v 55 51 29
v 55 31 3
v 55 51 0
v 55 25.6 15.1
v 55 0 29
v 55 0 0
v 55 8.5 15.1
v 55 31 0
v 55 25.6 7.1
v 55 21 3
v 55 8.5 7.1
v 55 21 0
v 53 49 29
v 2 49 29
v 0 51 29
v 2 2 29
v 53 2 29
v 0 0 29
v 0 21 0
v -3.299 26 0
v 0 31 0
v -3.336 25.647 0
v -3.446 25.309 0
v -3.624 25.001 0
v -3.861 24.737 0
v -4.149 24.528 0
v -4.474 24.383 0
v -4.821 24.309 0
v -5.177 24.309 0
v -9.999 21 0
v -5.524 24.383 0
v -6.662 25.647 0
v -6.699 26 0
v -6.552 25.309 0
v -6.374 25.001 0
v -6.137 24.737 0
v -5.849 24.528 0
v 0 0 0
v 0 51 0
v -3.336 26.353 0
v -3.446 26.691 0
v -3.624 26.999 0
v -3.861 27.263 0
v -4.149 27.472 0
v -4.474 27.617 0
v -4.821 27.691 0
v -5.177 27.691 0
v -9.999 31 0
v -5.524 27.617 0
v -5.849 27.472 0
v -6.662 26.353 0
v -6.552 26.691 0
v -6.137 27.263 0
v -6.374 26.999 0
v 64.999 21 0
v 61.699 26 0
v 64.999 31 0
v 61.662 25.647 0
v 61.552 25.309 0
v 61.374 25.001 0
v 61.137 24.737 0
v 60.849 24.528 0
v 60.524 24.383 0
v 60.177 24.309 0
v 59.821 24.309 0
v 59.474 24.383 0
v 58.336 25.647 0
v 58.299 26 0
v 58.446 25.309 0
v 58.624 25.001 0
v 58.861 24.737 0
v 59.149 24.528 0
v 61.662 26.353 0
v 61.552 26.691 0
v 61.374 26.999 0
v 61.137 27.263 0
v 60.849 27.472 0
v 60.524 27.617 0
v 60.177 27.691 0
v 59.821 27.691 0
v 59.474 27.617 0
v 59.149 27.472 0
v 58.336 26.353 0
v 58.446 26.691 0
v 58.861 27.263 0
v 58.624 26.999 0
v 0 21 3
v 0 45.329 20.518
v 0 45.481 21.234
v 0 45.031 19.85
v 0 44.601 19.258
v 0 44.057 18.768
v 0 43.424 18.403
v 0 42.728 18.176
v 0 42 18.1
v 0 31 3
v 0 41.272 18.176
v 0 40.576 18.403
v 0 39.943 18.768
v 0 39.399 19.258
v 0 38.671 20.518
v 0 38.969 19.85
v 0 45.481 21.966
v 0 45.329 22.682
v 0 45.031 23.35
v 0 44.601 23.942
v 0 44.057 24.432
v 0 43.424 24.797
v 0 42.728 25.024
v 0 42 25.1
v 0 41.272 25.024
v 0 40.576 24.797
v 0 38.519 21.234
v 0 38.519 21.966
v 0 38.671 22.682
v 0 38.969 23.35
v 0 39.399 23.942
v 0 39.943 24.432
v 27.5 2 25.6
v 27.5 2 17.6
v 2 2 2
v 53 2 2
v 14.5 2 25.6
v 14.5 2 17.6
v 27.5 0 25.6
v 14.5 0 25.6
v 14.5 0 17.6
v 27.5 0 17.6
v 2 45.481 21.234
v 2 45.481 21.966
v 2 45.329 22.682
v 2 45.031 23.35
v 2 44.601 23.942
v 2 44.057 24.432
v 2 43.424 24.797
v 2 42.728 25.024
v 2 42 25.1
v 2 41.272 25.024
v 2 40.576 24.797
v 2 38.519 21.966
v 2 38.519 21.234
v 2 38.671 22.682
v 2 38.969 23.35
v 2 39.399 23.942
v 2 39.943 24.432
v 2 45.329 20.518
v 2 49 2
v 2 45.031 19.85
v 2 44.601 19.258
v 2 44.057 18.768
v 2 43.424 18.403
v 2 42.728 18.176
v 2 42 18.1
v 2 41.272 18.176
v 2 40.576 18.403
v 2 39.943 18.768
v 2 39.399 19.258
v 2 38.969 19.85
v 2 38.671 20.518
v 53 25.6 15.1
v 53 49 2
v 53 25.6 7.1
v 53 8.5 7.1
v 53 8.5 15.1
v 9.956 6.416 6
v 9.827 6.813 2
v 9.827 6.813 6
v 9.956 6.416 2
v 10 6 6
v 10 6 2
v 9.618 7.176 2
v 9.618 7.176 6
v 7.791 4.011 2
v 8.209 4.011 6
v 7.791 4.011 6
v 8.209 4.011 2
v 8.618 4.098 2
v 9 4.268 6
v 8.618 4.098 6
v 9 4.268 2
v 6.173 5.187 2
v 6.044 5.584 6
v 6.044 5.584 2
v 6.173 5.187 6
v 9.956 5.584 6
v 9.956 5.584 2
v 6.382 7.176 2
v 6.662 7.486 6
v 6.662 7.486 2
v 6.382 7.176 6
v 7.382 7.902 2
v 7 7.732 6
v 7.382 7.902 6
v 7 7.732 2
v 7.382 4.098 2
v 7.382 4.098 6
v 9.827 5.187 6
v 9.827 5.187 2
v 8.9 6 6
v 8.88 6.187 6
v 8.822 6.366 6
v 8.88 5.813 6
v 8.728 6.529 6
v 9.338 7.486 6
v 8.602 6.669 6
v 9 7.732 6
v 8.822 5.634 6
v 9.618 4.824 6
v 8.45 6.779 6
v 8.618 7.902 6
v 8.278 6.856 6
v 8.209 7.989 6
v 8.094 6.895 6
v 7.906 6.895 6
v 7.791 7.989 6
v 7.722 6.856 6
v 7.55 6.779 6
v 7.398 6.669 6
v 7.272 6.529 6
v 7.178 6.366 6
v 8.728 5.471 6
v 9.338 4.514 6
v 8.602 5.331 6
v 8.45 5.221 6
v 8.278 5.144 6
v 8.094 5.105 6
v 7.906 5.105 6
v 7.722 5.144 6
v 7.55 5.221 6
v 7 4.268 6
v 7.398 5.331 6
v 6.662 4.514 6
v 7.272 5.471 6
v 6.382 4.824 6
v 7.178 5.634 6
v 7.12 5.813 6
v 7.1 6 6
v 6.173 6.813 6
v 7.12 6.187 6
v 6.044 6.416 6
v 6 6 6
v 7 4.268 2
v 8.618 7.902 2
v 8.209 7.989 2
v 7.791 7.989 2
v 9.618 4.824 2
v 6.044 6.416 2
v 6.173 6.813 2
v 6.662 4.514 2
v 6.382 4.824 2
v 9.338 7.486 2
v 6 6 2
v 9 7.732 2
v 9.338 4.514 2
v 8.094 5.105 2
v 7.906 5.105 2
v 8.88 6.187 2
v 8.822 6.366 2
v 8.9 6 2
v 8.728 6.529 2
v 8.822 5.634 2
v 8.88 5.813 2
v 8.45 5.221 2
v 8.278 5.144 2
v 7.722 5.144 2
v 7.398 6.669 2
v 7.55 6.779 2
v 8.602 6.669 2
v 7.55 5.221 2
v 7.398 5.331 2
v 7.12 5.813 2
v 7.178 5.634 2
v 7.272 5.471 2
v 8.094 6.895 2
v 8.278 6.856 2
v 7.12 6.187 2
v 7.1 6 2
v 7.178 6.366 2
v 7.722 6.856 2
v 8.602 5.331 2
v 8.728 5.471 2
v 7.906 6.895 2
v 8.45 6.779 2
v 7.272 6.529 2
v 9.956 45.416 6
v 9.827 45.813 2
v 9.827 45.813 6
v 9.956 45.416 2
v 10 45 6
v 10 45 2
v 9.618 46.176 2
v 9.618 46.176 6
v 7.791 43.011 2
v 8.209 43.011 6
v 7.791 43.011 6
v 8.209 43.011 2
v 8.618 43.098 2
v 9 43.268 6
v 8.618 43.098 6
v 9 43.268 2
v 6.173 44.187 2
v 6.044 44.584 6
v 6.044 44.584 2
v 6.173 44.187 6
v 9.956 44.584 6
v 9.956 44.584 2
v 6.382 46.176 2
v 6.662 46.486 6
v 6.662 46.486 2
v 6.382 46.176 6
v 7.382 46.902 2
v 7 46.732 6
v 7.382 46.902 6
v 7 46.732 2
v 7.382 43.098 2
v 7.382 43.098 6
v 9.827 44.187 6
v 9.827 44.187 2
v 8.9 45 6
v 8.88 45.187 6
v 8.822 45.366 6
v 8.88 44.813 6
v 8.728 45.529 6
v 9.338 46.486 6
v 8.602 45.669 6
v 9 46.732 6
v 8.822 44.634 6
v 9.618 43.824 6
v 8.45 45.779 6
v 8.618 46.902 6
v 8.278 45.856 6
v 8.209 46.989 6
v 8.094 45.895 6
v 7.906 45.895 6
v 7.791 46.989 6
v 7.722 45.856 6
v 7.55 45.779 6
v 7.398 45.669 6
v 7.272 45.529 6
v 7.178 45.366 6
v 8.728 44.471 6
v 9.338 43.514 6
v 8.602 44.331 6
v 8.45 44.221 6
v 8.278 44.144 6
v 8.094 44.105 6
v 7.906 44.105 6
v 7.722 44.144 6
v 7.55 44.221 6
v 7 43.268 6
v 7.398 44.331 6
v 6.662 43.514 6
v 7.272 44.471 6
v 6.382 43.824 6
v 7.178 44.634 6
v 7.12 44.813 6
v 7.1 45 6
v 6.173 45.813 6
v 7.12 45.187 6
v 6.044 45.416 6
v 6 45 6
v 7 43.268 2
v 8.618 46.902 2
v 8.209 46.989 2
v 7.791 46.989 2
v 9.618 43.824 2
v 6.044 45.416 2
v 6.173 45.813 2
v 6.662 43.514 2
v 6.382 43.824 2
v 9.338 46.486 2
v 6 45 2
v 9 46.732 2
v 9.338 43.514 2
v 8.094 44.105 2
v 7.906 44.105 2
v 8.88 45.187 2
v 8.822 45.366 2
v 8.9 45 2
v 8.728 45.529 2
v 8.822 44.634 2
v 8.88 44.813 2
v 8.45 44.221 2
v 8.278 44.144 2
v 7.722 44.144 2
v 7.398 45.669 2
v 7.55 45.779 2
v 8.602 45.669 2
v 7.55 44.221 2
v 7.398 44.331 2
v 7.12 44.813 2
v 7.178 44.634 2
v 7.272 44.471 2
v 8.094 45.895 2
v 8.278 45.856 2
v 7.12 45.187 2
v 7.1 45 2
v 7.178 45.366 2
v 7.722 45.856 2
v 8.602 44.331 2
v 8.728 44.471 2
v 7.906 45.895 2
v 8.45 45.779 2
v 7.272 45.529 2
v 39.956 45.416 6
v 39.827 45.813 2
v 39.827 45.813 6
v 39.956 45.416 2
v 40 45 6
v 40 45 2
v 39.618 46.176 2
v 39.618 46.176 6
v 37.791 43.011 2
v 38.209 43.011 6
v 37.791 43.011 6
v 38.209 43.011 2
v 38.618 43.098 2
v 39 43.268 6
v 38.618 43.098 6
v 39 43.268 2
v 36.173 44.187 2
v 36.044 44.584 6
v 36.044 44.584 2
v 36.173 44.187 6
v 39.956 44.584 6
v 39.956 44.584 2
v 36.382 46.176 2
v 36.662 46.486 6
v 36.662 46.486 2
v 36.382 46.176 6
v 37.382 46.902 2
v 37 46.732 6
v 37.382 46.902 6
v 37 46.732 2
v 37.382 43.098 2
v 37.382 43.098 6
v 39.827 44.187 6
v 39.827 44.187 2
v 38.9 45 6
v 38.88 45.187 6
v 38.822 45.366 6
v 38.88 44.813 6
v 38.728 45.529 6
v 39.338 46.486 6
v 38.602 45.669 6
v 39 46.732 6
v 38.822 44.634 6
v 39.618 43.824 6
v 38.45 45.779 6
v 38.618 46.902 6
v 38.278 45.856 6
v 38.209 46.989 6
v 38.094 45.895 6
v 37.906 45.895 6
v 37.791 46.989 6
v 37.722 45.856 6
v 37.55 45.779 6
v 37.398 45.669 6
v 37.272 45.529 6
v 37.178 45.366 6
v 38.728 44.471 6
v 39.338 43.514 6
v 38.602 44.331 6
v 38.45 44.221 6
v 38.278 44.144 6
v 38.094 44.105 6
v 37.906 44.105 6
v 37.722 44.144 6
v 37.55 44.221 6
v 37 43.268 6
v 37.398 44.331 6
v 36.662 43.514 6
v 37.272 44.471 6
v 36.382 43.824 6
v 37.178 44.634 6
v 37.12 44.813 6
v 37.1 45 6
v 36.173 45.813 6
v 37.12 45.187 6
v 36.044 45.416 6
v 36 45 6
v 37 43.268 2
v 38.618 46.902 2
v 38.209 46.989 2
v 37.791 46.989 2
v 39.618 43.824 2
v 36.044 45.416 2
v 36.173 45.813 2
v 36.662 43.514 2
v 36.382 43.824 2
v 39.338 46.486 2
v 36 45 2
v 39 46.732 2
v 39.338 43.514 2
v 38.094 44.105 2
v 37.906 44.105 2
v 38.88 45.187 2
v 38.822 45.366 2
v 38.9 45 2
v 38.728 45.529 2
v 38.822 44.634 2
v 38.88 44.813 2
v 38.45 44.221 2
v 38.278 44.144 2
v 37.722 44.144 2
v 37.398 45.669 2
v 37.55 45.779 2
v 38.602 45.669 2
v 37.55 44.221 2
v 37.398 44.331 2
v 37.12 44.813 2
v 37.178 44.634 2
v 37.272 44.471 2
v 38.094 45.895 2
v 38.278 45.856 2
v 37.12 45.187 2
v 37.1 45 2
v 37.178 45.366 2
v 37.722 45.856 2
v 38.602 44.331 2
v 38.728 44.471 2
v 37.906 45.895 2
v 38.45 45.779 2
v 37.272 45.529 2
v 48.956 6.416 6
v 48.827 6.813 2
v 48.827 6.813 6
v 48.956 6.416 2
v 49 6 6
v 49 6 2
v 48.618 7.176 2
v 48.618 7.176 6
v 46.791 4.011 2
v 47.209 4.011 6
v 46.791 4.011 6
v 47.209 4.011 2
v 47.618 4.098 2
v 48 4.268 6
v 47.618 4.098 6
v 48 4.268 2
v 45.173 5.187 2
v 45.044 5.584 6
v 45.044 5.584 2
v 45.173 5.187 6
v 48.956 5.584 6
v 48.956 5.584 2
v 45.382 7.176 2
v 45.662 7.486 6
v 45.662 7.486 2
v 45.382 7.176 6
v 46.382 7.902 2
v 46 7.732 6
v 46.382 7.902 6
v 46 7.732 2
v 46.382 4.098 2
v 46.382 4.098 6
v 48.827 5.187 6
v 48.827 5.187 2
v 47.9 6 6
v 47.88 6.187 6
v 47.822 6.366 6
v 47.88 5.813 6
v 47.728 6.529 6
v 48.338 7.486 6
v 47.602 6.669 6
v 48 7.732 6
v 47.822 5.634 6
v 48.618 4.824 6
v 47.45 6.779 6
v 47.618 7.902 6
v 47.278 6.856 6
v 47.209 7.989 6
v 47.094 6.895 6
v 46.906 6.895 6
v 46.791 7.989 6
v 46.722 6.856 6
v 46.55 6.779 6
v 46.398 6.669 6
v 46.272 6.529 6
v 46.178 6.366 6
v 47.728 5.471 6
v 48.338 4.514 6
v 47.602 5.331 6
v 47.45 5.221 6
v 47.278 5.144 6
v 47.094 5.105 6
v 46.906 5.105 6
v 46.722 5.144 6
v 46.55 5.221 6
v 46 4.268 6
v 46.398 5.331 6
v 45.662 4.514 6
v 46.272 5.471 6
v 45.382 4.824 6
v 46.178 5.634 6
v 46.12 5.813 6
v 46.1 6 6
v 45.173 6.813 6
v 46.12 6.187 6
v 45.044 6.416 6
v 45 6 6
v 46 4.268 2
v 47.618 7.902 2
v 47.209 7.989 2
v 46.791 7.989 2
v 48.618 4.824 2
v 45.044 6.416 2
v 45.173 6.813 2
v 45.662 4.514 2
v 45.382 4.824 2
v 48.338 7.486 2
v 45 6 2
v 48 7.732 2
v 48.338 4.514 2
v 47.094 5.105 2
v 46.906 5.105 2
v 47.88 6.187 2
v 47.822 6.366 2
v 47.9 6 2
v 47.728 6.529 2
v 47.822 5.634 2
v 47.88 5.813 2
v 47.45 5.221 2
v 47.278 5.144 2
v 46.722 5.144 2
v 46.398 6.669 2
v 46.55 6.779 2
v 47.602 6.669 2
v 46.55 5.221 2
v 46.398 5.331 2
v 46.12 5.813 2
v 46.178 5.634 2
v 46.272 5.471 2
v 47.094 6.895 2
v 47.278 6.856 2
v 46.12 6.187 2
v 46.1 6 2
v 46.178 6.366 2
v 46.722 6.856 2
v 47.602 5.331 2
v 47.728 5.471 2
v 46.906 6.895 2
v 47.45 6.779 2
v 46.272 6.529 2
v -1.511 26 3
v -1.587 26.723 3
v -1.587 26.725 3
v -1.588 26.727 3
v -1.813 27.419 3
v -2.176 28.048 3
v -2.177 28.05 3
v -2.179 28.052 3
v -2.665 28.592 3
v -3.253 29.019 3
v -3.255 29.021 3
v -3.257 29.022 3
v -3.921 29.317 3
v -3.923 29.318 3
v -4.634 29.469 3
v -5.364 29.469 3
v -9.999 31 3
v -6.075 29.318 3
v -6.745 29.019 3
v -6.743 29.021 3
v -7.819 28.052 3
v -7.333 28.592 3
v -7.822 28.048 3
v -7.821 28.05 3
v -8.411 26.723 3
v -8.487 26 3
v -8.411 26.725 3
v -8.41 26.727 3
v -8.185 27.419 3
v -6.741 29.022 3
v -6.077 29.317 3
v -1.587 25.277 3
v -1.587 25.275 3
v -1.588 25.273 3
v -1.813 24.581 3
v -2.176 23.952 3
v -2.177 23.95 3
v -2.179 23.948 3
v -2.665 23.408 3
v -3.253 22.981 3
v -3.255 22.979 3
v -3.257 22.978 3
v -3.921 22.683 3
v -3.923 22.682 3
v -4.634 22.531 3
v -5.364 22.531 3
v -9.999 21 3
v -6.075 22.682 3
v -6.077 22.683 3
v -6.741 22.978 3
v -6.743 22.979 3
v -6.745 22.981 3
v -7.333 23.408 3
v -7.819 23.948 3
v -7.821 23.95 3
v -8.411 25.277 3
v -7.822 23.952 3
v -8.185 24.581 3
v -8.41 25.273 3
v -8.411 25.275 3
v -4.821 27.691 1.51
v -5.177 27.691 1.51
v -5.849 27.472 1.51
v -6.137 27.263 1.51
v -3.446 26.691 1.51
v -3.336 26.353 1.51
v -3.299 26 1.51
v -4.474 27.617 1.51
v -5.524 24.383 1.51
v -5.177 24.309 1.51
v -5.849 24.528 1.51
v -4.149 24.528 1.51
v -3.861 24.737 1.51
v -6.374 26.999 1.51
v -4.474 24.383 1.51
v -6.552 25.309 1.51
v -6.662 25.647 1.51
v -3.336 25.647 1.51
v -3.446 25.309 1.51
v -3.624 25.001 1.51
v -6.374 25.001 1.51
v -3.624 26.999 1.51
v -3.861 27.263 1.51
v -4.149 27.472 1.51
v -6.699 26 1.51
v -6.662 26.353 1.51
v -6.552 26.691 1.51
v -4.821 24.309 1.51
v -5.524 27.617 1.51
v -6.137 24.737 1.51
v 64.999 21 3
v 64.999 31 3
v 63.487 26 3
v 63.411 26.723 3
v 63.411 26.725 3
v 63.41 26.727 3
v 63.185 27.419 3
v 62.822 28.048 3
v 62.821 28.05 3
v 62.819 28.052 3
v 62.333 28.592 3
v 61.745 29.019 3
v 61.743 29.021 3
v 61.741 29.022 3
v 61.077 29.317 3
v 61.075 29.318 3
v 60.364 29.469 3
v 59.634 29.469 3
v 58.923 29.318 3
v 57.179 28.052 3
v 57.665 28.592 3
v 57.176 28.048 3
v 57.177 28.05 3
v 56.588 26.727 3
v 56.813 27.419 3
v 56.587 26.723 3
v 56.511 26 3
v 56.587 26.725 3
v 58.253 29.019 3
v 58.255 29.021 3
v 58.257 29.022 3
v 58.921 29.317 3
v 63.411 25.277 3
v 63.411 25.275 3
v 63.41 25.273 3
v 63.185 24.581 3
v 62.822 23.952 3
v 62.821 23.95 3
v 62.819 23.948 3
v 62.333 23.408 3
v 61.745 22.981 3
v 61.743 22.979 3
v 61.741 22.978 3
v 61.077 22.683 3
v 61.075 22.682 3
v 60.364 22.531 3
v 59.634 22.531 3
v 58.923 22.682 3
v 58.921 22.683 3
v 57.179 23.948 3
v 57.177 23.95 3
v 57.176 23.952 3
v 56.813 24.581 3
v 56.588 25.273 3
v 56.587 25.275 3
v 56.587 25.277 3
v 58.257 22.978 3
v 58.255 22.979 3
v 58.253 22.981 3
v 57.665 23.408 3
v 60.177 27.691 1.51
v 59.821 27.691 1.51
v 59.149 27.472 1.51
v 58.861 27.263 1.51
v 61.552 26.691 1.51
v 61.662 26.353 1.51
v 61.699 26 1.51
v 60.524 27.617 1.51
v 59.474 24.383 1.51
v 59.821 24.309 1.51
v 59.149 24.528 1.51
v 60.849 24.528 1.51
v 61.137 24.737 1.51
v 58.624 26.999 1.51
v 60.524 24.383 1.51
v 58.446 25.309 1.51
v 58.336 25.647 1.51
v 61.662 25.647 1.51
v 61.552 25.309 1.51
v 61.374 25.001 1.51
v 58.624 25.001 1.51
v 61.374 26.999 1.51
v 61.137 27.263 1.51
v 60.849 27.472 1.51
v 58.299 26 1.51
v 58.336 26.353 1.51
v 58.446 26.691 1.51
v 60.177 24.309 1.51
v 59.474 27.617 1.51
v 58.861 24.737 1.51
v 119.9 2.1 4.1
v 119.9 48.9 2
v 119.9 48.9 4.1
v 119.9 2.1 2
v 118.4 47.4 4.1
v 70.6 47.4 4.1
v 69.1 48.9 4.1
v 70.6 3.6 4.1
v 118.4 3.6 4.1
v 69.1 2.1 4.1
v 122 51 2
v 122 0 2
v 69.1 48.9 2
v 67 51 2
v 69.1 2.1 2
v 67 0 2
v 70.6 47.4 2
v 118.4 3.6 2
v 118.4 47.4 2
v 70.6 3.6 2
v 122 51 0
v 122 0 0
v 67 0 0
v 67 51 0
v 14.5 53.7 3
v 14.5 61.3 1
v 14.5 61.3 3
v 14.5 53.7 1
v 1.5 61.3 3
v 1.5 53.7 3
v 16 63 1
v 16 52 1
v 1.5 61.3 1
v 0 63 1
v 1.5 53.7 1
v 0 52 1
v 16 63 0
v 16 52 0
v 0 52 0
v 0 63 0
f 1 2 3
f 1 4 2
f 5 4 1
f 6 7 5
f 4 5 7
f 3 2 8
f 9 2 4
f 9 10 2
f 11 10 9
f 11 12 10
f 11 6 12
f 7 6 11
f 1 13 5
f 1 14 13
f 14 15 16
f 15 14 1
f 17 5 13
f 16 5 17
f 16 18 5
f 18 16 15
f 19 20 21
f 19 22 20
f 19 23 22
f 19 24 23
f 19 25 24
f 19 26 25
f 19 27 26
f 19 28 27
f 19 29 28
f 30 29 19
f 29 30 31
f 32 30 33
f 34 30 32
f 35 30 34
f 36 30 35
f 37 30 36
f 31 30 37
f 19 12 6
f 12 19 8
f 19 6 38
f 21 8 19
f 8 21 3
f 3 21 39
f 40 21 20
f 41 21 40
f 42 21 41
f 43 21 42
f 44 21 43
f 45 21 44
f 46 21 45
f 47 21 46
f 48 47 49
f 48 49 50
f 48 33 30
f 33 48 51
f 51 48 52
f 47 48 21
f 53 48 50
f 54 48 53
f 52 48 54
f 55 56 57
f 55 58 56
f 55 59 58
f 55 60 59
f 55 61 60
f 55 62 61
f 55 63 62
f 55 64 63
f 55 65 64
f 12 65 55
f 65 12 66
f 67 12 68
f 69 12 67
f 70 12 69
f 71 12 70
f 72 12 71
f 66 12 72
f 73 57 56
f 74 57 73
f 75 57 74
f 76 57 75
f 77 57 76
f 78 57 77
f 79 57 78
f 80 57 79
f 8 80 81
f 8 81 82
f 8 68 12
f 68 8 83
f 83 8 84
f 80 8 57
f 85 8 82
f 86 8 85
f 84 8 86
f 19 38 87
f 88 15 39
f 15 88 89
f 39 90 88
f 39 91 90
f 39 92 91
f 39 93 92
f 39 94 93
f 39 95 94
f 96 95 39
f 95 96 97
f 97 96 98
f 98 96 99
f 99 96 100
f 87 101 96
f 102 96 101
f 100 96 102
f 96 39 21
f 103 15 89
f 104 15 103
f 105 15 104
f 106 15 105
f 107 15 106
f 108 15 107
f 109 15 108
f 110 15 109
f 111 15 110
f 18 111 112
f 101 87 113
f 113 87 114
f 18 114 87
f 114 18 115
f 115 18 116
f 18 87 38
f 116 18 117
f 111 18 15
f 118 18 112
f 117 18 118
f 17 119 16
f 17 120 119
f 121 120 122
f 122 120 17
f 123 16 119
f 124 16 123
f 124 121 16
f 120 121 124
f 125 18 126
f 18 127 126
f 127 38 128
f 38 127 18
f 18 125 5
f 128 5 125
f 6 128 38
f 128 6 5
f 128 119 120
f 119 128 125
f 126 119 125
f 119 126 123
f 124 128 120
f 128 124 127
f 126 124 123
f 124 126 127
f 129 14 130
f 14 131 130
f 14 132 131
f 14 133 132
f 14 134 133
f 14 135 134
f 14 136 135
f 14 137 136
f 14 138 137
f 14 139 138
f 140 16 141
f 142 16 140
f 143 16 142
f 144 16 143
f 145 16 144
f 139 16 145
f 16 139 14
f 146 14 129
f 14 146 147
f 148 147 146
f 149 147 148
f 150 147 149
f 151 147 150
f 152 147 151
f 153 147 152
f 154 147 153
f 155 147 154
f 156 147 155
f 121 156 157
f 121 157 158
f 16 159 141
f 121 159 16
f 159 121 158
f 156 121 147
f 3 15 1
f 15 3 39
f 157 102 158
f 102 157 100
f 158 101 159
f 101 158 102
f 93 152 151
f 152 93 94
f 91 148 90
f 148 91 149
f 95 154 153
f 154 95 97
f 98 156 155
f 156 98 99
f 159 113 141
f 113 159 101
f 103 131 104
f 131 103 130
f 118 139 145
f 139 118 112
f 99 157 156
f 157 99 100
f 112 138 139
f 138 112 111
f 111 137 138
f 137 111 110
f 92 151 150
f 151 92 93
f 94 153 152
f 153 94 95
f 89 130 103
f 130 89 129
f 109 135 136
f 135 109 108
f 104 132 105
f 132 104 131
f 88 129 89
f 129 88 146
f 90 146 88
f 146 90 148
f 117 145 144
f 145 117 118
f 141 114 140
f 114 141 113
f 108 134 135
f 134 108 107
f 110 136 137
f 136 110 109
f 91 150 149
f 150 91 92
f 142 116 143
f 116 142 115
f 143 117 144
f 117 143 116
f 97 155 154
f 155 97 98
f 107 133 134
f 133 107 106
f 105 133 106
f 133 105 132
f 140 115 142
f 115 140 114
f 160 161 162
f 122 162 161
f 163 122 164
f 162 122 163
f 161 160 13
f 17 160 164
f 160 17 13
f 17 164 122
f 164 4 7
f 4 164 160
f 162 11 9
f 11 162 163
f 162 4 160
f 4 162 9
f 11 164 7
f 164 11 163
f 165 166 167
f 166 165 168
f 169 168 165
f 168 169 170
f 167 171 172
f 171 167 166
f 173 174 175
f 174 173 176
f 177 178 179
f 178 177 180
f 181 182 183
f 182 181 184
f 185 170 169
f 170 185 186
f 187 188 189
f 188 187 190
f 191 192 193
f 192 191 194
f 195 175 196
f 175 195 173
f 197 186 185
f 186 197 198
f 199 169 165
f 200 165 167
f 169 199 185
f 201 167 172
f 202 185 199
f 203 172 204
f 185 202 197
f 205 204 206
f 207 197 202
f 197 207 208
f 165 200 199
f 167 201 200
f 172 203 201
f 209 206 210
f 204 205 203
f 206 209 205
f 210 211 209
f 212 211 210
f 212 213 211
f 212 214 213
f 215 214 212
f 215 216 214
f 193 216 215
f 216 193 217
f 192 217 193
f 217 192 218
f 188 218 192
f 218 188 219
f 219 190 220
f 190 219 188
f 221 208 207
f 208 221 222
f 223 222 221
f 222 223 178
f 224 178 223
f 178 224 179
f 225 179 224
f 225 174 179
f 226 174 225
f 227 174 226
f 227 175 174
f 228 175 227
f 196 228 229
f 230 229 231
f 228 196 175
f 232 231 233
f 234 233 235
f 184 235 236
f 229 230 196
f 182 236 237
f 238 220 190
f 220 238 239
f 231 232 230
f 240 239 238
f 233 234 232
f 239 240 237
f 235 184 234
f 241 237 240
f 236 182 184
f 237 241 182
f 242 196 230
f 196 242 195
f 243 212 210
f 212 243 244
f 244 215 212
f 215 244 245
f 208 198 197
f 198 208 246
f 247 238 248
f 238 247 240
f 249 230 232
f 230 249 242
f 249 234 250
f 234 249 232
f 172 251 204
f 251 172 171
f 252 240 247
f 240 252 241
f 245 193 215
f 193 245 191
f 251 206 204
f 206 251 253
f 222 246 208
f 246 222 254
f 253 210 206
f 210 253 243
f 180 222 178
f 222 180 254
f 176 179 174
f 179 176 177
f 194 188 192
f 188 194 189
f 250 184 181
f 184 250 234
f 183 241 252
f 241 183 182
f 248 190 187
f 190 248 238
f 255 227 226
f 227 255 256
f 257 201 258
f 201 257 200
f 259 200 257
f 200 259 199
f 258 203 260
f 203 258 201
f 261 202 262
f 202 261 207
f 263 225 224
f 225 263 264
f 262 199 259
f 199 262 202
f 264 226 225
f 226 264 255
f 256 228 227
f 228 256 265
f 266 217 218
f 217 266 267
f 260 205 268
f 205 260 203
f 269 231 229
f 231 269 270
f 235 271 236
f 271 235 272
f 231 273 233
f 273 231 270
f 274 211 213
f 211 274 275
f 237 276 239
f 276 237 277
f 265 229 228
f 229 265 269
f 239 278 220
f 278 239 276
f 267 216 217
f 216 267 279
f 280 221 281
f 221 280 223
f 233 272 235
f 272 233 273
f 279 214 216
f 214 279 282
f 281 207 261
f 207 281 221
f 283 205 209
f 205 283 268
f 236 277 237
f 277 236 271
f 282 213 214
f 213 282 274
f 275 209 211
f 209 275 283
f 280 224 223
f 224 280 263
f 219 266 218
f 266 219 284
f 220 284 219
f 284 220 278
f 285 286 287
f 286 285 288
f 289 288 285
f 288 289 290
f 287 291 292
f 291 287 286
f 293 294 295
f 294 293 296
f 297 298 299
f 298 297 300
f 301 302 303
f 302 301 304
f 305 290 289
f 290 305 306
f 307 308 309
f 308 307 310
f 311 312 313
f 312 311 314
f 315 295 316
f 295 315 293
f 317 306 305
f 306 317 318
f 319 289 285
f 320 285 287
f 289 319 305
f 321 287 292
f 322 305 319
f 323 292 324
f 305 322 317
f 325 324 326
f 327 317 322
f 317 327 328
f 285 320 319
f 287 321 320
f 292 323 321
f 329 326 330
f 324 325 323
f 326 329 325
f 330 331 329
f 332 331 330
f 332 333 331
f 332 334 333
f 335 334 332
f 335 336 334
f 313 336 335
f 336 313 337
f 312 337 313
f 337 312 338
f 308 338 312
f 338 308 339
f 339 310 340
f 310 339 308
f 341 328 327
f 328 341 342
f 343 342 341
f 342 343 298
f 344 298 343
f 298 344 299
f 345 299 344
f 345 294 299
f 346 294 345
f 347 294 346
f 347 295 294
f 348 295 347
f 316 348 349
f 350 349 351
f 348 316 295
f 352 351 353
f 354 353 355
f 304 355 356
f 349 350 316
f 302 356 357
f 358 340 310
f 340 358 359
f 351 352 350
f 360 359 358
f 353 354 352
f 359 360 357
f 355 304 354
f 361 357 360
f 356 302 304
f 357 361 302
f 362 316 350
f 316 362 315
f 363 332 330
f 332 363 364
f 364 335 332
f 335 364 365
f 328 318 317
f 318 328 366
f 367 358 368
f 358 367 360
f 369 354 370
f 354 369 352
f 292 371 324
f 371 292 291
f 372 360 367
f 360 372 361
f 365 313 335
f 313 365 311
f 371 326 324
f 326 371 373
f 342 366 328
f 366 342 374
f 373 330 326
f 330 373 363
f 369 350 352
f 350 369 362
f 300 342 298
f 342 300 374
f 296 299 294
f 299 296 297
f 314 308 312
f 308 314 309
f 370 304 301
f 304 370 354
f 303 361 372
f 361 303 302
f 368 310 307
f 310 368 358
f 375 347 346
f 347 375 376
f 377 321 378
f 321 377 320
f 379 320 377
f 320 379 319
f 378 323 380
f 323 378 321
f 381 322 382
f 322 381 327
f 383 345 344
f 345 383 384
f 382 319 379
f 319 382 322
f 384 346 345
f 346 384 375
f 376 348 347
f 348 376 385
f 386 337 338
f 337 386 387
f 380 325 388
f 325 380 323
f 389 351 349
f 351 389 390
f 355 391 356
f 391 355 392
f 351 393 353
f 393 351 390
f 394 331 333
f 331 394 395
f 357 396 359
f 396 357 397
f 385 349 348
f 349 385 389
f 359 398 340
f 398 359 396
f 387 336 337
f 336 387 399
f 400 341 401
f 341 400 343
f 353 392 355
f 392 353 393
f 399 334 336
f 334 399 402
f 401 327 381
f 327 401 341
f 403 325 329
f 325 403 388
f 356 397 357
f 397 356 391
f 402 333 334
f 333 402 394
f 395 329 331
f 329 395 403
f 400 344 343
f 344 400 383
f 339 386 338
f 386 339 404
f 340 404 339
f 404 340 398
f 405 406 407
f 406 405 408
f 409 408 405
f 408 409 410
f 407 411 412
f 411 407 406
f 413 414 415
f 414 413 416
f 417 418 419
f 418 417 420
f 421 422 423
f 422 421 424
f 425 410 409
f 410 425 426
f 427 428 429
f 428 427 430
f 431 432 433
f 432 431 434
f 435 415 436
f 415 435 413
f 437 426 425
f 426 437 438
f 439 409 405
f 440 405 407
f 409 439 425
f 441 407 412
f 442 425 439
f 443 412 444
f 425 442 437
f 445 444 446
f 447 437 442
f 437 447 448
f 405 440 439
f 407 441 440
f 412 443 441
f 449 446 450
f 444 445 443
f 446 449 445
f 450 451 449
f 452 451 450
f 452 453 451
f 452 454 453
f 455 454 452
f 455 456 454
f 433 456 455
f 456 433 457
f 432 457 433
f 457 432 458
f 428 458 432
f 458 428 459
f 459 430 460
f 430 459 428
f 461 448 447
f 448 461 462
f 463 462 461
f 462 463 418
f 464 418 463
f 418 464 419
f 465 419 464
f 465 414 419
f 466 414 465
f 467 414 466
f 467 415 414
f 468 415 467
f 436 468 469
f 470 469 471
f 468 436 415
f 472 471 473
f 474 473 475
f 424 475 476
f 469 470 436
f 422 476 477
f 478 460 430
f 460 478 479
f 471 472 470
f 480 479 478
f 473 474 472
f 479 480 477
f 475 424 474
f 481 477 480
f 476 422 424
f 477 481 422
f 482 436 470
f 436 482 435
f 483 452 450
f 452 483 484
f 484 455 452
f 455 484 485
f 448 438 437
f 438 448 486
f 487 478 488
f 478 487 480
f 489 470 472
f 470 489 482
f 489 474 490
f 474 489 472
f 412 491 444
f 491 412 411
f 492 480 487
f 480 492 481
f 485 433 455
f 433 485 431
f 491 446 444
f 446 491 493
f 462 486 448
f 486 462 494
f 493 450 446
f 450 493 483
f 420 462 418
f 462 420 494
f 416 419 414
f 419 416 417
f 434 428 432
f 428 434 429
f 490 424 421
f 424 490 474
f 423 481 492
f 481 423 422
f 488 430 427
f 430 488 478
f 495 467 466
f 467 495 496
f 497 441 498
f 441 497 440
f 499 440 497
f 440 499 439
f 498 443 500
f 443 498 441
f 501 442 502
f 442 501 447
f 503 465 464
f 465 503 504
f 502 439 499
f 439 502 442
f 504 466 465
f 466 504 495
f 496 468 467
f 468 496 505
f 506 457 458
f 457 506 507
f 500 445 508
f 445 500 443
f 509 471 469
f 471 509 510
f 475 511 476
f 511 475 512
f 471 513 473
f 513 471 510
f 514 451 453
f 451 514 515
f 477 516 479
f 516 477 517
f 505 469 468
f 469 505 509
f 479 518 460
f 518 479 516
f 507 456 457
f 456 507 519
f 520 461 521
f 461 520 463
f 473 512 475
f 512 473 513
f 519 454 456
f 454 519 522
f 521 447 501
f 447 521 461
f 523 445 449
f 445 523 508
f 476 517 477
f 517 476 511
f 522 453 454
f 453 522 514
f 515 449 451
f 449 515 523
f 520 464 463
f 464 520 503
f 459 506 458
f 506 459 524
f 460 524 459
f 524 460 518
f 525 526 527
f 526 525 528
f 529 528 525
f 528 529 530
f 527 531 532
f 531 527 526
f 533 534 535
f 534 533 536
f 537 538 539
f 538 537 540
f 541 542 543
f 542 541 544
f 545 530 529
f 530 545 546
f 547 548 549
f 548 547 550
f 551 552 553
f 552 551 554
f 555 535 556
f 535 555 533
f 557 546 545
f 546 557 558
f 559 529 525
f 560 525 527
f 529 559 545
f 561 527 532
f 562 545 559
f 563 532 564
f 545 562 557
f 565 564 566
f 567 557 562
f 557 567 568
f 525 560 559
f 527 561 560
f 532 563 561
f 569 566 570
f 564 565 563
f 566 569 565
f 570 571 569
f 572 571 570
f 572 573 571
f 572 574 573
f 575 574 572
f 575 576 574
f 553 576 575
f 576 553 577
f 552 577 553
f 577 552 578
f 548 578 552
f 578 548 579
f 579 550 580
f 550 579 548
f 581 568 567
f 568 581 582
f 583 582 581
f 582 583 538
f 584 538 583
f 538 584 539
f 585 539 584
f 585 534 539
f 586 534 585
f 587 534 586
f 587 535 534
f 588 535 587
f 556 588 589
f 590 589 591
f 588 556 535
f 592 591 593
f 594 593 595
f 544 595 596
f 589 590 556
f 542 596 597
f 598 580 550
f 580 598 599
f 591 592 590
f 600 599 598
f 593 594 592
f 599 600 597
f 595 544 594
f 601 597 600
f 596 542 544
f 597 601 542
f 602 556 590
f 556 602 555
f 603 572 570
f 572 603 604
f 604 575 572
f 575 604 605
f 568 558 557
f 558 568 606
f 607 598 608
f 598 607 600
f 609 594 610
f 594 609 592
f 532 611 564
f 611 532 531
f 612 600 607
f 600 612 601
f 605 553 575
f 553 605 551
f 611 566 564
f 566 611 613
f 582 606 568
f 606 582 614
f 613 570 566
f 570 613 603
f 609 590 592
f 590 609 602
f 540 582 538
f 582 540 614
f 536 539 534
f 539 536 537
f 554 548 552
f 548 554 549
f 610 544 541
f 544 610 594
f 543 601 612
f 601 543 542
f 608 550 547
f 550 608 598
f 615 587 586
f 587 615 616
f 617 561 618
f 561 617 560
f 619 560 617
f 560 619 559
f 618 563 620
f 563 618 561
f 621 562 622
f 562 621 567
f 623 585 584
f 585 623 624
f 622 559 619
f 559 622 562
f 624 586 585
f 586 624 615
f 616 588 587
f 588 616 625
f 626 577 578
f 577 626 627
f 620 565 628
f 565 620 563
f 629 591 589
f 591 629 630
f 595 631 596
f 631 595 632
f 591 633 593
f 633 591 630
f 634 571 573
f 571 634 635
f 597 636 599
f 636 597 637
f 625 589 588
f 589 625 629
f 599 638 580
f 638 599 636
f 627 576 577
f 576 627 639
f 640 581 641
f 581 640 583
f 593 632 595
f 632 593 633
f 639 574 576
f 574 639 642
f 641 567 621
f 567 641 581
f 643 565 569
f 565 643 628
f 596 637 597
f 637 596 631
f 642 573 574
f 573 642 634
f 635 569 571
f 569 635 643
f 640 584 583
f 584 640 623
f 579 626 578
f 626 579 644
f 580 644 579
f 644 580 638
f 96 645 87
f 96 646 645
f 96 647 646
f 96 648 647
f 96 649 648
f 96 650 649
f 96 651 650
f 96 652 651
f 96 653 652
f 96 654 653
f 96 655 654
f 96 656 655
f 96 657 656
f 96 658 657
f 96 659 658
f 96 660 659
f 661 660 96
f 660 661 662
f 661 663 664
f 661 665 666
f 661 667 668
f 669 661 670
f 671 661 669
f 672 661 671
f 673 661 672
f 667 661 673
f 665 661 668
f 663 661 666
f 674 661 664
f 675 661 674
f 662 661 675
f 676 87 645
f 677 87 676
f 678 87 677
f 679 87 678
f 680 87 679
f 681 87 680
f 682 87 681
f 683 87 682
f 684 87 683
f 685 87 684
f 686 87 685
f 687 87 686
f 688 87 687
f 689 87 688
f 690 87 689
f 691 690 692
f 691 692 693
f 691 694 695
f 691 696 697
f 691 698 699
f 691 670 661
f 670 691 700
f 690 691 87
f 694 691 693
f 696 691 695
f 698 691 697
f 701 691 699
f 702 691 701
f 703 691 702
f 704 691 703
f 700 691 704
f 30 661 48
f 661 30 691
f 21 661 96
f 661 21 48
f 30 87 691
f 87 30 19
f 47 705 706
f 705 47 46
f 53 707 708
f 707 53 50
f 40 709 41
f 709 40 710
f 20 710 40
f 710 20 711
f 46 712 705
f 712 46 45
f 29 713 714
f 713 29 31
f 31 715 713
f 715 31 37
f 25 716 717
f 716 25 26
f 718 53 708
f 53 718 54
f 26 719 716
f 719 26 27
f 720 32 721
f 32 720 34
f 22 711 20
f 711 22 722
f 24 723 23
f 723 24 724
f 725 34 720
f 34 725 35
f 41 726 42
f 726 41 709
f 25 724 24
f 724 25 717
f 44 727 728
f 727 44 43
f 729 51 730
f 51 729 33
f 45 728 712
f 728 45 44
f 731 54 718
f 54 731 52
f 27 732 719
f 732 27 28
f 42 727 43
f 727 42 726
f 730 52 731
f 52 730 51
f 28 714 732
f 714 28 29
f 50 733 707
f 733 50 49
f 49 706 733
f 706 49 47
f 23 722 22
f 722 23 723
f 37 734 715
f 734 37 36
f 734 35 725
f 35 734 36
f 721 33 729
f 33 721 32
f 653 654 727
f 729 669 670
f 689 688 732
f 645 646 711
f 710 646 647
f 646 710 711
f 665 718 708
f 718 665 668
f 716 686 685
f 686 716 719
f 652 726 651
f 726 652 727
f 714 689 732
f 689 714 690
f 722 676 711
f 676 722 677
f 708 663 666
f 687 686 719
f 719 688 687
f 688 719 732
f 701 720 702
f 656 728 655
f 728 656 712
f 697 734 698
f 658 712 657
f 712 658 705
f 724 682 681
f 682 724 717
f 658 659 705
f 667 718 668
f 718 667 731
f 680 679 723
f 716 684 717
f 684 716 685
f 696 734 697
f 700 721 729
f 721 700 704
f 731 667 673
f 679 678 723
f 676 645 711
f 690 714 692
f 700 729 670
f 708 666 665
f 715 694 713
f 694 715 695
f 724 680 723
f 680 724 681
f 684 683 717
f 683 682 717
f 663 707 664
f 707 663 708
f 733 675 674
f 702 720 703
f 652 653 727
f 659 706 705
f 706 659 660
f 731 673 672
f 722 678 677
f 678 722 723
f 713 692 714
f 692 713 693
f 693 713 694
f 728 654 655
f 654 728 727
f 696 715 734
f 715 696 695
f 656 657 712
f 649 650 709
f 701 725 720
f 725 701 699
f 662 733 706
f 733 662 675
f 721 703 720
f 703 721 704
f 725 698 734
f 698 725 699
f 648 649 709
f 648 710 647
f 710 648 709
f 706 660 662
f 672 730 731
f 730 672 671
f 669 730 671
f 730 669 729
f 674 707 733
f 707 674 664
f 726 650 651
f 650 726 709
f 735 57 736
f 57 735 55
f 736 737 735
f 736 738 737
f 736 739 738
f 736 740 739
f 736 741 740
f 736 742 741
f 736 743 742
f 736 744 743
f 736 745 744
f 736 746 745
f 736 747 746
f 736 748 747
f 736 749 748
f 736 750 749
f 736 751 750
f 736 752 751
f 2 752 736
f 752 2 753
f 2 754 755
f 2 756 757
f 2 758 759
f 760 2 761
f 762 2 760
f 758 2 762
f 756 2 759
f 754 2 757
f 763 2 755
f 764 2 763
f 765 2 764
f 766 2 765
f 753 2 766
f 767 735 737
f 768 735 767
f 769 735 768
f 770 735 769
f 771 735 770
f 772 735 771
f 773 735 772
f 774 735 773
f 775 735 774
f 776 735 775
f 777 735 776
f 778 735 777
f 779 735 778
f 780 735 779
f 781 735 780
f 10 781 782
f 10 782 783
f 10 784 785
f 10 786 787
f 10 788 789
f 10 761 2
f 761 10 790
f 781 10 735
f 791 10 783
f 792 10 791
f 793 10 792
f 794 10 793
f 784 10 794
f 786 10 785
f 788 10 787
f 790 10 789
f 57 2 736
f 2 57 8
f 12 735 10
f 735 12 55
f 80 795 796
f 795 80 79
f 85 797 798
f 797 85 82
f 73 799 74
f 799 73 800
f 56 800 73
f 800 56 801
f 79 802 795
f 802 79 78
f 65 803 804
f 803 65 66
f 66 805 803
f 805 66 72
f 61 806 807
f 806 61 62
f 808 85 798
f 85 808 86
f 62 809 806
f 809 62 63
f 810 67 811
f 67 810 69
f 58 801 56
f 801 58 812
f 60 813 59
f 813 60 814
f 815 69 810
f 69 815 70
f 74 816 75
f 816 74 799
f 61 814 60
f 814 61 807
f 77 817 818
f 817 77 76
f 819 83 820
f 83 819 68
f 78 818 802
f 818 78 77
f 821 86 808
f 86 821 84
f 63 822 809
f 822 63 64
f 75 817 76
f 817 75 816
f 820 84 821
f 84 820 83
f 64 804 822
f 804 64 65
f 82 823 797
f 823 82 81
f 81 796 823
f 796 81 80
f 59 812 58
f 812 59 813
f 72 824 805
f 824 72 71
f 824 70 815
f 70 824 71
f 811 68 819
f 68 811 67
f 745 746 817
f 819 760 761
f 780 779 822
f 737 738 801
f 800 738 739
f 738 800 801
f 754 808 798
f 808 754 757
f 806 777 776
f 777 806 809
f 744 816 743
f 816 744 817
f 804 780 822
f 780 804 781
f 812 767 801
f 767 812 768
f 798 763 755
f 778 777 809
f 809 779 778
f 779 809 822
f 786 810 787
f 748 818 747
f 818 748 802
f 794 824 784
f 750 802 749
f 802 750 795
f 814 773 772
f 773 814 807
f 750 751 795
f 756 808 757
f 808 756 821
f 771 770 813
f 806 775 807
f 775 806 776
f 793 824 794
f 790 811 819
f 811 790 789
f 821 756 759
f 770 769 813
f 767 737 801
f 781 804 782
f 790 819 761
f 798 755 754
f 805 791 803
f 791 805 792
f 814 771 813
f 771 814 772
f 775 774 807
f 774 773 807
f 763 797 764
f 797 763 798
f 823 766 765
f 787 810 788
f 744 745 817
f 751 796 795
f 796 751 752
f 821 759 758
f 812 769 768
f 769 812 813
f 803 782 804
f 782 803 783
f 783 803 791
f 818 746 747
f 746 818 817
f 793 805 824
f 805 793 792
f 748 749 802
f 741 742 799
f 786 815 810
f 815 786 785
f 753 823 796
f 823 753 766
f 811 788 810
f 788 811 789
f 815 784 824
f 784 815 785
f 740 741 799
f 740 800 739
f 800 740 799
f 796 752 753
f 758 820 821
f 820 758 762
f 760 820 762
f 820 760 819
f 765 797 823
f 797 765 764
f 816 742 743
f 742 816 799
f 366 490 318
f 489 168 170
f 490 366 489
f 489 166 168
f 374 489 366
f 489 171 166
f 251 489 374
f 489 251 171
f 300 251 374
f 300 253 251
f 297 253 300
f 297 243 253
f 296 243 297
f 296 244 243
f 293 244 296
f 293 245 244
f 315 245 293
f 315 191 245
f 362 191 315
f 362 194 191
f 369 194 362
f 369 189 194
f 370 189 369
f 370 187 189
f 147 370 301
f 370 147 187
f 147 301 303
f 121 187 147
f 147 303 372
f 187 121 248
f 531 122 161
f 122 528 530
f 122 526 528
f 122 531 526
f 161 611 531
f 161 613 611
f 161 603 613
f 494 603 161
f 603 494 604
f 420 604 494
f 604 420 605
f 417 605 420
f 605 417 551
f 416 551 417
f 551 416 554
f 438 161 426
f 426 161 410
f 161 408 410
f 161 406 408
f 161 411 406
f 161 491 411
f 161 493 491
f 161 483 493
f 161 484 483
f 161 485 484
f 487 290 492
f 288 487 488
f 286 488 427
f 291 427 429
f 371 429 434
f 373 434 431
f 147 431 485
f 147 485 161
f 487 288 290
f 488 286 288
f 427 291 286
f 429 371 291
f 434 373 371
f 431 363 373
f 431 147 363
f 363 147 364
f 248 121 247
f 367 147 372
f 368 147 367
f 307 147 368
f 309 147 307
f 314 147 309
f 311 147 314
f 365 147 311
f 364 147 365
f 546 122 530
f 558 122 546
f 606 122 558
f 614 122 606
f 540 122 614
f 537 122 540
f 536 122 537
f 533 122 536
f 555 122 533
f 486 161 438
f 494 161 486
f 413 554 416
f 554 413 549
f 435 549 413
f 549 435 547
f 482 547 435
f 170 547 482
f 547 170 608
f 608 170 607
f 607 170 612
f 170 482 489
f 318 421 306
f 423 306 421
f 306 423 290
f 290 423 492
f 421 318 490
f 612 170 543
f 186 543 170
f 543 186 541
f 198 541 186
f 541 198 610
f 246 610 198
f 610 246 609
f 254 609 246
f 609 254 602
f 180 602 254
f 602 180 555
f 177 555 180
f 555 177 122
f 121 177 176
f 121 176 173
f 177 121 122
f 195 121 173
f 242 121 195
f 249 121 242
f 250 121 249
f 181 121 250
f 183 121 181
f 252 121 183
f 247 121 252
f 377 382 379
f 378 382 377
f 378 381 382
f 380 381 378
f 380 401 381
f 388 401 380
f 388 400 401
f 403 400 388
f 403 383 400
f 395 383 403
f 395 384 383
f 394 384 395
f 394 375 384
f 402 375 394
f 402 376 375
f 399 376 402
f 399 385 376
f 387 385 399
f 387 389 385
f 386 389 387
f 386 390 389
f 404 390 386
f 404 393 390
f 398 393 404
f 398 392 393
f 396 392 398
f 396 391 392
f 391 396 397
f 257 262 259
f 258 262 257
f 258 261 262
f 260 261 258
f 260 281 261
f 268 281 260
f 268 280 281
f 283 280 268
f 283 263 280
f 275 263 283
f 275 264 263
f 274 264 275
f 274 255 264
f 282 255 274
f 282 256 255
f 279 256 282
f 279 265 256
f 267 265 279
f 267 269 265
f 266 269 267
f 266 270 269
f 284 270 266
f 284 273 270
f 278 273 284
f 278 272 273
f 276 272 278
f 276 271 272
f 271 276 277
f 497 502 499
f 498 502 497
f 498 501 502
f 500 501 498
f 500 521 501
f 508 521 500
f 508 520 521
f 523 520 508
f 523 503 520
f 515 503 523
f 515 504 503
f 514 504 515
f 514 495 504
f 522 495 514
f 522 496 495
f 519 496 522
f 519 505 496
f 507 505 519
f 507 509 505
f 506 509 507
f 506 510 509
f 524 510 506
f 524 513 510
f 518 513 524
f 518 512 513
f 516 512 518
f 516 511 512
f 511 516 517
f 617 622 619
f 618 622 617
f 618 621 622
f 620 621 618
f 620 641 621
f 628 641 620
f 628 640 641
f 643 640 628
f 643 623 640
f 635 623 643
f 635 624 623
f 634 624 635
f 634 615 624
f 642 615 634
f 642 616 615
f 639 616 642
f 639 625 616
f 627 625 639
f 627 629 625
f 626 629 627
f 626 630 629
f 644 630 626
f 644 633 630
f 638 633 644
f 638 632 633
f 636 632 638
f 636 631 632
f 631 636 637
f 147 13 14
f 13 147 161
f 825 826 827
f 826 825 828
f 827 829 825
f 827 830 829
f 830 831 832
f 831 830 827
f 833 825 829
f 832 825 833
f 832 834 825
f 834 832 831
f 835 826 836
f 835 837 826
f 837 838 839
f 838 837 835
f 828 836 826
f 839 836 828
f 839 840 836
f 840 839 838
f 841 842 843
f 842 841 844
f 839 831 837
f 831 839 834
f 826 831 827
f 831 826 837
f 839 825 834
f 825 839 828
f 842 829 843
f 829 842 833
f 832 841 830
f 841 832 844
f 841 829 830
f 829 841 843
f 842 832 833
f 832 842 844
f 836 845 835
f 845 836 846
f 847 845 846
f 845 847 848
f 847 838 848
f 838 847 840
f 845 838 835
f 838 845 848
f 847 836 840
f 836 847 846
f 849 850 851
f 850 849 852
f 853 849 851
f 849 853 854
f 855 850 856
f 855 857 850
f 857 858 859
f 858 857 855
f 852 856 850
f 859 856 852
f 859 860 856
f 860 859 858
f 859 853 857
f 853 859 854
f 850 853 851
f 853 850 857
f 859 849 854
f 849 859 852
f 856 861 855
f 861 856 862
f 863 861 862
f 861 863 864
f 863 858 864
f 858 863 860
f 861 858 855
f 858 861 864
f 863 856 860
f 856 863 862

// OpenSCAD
$fs = 0.1;

// Enable parts of the case
mainCaseEnable = true;
topPanelEnable = true;
usbAccessHole = true;

// Case
ctn = 2;  // Case thickness
ch = 29;  // Case height
fs = 1;   // Free space between PCB & case
efs = 4;  // Extra free space on north & west borders to allow inserting PCB in case

// PCB
pcbw = 45;  // PCB width
pcbl = 45;  // PCB length
pcbt = 1.6; // PCB thickness

// Board pins
ph = 4;     // Height
pr = 2;     // Radius
pshr = 0.9; // Screw hole radius
fpx = 3;    // First pin x position from west PCB border
fpy = 3;    // First pin y position from south PCB border
pxd = 39;   // x distance between pins
pxd2 = 30;  // x distance between pins of the second row
pyd = 39;   // y distance between pins

// Screw terminals
aisty = 6;  // y position from south PCB border (AIS)
sth = 7;    // Height
stw = 16.1; // Width
stfp = 0.5; // Freespace between hole borders and connectors

// Screw pads
spw = 10;   // Pad width
sdia = 3.2; // screw diameter

// Teensy USB connector
tuch = 8;
tucw = 13;
tucx = 16;
tucz = 14;

// RF Antenna
antw = 7;  // Hole diameter
anty = 41; // y position of the antenna hole from south PCB border
antz = 14; // z position of the antenna hole from PCB surface

// Board pin definition
module boardPin(x, y)
{
    difference()
    { // Pin
        translate([ x, y, 0 ]) cylinder(ph + ctn, pr, pr);
        // Screw hole
        translate([ x, y, 0 ]) cylinder(ph + ctn + 0.1, pshr, pshr);
    }
}

// Screw pad definition
module screwPad()
{
    difference()
    {
        cube([ spw, spw, ctn + 1 ]);
        translate([ spw / 2, spw / 2, -1 ]) cylinder(ctn + 3, sdia / 2 + 0.1, sdia / 2 + 0.1);
        translate([ spw / 2, spw / 2, 1.5 + 0.01 ]) cylinder(1.5, sdia / 2 + 0.1, sdia / 2 + 1.8 + 0.1);
    }
}

if (mainCaseEnable == true)
{
    // Bottom panel
    cube([ pcbw + ctn * 2 + fs * 2 + efs, pcbl + ctn * 2 + fs * 2, ctn ]);

    // South panel
    difference()
    {
        // Panel
        cube([ pcbw + ctn * 2 + fs * 2 + efs, ctn, ch ]);
        if (usbAccessHole == true)
        {
            // Teensy USB connector hole
            translate([ tucx + ctn + fs + efs / 2, -0.1, ctn + ph + pcbt + tucz ]) cube([ tucw, ctn + 3, tuch ], center = true);
        };
    }

    // North panel
    translate([ 0, pcbl + ctn * 2 + fs * 2 - ctn, 0 ]) cube([ pcbw + ctn * 2 + fs * 2 + efs, ctn, ch ]);

    // West panel
    difference()
    {
        cube([ ctn, pcbl + ctn * 2 + fs * 2, ch ]);
                // 868MHz Antenna hole
        translate([ -5 - ctn - 0.1 - efs, anty + fs, ctn + ph + pcbt + antz ]) rotate([ 0, 90, 0 ])
            cylinder(15, antw / 2, antw / 2);
    }

    // East panel
    difference()
    {
        // Panel
        translate([ pcbw + ctn * 2 + fs * 2 - ctn + efs, 0, 0 ]) cube([ ctn, pcbl + ctn * 2 + fs * 2, ch ]);
        // Power/AIS connector hole
        translate([ pcbw + ctn * 2 + fs * 2 - ctn - 0.1 + efs, aisty + ctn + fs - stfp, ctn + ph + pcbt - stfp ])
            cube([ 5, stw + stfp * 2, sth + stfp * 2 ]);
    };

    // PCB pins
    boardPin(fpx + fs + efs, fpy + ctn + fs);
    boardPin(fpx + fs + efs, fpy + ctn + fs + pyd);
    boardPin(fpx + pxd2 + fs + efs, fpy + ctn + fs + pyd);
    boardPin(fpx + fs + pxd + efs, fpy + ctn + fs);

    // Screw pads
    translate([ -spw + 0.001, pcbl / 2 + spw / 4 + fs * 2 - spw + efs, 0 ]) screwPad();
    translate([ pcbw + ctn * 2 + fs * 2 + efs - 0.001, pcbl / 2 + spw / 4 + fs * 2 - spw + efs, 0 ]) screwPad();
}

// Top panel
if (topPanelEnable == true)
{
    panelShift = 20;

    translate([ pcbw + fs * 2 + panelShift, 0, 0 ]) cube([ pcbw + ctn * 2 + fs * 2 + efs, pcbl + ctn * 2 + fs * 2, ctn ]);
    translate([ pcbw + fs * 2 + panelShift + ctn + 0.1, ctn + 0.1, ctn ])
        difference()
        {
            cube([ pcbw + ctn * 2 + fs * 2 + efs - ctn * 2 - 0.2, pcbl + ctn * 2 + fs * 2 - ctn * 2 - 0.2, 2.1 ]);
            translate([ 1.5, 1.5, -0.1 ])
                cube([ pcbw + fs * 2 + efs - 0.2 - 3, pcbl + fs * 2 - 0.2 - 3, 2.5 ]);
        }
}

if (usbAccessHole == true)
{
    usbPlugShift = pcbl + fs * 2 + 5;
    usbPlugExt = 1.5;
    usbPlugMargin = 0.2;

    translate([ usbPlugExt, usbPlugShift + usbPlugExt + usbPlugMargin, 1 ]) cube([ tucw, tuch - usbPlugMargin * 2, ctn]);
    translate([ 0, usbPlugShift, 0 ]) cube([ tucw + usbPlugExt * 2, tuch + usbPlugExt * 2, 1]);
};
